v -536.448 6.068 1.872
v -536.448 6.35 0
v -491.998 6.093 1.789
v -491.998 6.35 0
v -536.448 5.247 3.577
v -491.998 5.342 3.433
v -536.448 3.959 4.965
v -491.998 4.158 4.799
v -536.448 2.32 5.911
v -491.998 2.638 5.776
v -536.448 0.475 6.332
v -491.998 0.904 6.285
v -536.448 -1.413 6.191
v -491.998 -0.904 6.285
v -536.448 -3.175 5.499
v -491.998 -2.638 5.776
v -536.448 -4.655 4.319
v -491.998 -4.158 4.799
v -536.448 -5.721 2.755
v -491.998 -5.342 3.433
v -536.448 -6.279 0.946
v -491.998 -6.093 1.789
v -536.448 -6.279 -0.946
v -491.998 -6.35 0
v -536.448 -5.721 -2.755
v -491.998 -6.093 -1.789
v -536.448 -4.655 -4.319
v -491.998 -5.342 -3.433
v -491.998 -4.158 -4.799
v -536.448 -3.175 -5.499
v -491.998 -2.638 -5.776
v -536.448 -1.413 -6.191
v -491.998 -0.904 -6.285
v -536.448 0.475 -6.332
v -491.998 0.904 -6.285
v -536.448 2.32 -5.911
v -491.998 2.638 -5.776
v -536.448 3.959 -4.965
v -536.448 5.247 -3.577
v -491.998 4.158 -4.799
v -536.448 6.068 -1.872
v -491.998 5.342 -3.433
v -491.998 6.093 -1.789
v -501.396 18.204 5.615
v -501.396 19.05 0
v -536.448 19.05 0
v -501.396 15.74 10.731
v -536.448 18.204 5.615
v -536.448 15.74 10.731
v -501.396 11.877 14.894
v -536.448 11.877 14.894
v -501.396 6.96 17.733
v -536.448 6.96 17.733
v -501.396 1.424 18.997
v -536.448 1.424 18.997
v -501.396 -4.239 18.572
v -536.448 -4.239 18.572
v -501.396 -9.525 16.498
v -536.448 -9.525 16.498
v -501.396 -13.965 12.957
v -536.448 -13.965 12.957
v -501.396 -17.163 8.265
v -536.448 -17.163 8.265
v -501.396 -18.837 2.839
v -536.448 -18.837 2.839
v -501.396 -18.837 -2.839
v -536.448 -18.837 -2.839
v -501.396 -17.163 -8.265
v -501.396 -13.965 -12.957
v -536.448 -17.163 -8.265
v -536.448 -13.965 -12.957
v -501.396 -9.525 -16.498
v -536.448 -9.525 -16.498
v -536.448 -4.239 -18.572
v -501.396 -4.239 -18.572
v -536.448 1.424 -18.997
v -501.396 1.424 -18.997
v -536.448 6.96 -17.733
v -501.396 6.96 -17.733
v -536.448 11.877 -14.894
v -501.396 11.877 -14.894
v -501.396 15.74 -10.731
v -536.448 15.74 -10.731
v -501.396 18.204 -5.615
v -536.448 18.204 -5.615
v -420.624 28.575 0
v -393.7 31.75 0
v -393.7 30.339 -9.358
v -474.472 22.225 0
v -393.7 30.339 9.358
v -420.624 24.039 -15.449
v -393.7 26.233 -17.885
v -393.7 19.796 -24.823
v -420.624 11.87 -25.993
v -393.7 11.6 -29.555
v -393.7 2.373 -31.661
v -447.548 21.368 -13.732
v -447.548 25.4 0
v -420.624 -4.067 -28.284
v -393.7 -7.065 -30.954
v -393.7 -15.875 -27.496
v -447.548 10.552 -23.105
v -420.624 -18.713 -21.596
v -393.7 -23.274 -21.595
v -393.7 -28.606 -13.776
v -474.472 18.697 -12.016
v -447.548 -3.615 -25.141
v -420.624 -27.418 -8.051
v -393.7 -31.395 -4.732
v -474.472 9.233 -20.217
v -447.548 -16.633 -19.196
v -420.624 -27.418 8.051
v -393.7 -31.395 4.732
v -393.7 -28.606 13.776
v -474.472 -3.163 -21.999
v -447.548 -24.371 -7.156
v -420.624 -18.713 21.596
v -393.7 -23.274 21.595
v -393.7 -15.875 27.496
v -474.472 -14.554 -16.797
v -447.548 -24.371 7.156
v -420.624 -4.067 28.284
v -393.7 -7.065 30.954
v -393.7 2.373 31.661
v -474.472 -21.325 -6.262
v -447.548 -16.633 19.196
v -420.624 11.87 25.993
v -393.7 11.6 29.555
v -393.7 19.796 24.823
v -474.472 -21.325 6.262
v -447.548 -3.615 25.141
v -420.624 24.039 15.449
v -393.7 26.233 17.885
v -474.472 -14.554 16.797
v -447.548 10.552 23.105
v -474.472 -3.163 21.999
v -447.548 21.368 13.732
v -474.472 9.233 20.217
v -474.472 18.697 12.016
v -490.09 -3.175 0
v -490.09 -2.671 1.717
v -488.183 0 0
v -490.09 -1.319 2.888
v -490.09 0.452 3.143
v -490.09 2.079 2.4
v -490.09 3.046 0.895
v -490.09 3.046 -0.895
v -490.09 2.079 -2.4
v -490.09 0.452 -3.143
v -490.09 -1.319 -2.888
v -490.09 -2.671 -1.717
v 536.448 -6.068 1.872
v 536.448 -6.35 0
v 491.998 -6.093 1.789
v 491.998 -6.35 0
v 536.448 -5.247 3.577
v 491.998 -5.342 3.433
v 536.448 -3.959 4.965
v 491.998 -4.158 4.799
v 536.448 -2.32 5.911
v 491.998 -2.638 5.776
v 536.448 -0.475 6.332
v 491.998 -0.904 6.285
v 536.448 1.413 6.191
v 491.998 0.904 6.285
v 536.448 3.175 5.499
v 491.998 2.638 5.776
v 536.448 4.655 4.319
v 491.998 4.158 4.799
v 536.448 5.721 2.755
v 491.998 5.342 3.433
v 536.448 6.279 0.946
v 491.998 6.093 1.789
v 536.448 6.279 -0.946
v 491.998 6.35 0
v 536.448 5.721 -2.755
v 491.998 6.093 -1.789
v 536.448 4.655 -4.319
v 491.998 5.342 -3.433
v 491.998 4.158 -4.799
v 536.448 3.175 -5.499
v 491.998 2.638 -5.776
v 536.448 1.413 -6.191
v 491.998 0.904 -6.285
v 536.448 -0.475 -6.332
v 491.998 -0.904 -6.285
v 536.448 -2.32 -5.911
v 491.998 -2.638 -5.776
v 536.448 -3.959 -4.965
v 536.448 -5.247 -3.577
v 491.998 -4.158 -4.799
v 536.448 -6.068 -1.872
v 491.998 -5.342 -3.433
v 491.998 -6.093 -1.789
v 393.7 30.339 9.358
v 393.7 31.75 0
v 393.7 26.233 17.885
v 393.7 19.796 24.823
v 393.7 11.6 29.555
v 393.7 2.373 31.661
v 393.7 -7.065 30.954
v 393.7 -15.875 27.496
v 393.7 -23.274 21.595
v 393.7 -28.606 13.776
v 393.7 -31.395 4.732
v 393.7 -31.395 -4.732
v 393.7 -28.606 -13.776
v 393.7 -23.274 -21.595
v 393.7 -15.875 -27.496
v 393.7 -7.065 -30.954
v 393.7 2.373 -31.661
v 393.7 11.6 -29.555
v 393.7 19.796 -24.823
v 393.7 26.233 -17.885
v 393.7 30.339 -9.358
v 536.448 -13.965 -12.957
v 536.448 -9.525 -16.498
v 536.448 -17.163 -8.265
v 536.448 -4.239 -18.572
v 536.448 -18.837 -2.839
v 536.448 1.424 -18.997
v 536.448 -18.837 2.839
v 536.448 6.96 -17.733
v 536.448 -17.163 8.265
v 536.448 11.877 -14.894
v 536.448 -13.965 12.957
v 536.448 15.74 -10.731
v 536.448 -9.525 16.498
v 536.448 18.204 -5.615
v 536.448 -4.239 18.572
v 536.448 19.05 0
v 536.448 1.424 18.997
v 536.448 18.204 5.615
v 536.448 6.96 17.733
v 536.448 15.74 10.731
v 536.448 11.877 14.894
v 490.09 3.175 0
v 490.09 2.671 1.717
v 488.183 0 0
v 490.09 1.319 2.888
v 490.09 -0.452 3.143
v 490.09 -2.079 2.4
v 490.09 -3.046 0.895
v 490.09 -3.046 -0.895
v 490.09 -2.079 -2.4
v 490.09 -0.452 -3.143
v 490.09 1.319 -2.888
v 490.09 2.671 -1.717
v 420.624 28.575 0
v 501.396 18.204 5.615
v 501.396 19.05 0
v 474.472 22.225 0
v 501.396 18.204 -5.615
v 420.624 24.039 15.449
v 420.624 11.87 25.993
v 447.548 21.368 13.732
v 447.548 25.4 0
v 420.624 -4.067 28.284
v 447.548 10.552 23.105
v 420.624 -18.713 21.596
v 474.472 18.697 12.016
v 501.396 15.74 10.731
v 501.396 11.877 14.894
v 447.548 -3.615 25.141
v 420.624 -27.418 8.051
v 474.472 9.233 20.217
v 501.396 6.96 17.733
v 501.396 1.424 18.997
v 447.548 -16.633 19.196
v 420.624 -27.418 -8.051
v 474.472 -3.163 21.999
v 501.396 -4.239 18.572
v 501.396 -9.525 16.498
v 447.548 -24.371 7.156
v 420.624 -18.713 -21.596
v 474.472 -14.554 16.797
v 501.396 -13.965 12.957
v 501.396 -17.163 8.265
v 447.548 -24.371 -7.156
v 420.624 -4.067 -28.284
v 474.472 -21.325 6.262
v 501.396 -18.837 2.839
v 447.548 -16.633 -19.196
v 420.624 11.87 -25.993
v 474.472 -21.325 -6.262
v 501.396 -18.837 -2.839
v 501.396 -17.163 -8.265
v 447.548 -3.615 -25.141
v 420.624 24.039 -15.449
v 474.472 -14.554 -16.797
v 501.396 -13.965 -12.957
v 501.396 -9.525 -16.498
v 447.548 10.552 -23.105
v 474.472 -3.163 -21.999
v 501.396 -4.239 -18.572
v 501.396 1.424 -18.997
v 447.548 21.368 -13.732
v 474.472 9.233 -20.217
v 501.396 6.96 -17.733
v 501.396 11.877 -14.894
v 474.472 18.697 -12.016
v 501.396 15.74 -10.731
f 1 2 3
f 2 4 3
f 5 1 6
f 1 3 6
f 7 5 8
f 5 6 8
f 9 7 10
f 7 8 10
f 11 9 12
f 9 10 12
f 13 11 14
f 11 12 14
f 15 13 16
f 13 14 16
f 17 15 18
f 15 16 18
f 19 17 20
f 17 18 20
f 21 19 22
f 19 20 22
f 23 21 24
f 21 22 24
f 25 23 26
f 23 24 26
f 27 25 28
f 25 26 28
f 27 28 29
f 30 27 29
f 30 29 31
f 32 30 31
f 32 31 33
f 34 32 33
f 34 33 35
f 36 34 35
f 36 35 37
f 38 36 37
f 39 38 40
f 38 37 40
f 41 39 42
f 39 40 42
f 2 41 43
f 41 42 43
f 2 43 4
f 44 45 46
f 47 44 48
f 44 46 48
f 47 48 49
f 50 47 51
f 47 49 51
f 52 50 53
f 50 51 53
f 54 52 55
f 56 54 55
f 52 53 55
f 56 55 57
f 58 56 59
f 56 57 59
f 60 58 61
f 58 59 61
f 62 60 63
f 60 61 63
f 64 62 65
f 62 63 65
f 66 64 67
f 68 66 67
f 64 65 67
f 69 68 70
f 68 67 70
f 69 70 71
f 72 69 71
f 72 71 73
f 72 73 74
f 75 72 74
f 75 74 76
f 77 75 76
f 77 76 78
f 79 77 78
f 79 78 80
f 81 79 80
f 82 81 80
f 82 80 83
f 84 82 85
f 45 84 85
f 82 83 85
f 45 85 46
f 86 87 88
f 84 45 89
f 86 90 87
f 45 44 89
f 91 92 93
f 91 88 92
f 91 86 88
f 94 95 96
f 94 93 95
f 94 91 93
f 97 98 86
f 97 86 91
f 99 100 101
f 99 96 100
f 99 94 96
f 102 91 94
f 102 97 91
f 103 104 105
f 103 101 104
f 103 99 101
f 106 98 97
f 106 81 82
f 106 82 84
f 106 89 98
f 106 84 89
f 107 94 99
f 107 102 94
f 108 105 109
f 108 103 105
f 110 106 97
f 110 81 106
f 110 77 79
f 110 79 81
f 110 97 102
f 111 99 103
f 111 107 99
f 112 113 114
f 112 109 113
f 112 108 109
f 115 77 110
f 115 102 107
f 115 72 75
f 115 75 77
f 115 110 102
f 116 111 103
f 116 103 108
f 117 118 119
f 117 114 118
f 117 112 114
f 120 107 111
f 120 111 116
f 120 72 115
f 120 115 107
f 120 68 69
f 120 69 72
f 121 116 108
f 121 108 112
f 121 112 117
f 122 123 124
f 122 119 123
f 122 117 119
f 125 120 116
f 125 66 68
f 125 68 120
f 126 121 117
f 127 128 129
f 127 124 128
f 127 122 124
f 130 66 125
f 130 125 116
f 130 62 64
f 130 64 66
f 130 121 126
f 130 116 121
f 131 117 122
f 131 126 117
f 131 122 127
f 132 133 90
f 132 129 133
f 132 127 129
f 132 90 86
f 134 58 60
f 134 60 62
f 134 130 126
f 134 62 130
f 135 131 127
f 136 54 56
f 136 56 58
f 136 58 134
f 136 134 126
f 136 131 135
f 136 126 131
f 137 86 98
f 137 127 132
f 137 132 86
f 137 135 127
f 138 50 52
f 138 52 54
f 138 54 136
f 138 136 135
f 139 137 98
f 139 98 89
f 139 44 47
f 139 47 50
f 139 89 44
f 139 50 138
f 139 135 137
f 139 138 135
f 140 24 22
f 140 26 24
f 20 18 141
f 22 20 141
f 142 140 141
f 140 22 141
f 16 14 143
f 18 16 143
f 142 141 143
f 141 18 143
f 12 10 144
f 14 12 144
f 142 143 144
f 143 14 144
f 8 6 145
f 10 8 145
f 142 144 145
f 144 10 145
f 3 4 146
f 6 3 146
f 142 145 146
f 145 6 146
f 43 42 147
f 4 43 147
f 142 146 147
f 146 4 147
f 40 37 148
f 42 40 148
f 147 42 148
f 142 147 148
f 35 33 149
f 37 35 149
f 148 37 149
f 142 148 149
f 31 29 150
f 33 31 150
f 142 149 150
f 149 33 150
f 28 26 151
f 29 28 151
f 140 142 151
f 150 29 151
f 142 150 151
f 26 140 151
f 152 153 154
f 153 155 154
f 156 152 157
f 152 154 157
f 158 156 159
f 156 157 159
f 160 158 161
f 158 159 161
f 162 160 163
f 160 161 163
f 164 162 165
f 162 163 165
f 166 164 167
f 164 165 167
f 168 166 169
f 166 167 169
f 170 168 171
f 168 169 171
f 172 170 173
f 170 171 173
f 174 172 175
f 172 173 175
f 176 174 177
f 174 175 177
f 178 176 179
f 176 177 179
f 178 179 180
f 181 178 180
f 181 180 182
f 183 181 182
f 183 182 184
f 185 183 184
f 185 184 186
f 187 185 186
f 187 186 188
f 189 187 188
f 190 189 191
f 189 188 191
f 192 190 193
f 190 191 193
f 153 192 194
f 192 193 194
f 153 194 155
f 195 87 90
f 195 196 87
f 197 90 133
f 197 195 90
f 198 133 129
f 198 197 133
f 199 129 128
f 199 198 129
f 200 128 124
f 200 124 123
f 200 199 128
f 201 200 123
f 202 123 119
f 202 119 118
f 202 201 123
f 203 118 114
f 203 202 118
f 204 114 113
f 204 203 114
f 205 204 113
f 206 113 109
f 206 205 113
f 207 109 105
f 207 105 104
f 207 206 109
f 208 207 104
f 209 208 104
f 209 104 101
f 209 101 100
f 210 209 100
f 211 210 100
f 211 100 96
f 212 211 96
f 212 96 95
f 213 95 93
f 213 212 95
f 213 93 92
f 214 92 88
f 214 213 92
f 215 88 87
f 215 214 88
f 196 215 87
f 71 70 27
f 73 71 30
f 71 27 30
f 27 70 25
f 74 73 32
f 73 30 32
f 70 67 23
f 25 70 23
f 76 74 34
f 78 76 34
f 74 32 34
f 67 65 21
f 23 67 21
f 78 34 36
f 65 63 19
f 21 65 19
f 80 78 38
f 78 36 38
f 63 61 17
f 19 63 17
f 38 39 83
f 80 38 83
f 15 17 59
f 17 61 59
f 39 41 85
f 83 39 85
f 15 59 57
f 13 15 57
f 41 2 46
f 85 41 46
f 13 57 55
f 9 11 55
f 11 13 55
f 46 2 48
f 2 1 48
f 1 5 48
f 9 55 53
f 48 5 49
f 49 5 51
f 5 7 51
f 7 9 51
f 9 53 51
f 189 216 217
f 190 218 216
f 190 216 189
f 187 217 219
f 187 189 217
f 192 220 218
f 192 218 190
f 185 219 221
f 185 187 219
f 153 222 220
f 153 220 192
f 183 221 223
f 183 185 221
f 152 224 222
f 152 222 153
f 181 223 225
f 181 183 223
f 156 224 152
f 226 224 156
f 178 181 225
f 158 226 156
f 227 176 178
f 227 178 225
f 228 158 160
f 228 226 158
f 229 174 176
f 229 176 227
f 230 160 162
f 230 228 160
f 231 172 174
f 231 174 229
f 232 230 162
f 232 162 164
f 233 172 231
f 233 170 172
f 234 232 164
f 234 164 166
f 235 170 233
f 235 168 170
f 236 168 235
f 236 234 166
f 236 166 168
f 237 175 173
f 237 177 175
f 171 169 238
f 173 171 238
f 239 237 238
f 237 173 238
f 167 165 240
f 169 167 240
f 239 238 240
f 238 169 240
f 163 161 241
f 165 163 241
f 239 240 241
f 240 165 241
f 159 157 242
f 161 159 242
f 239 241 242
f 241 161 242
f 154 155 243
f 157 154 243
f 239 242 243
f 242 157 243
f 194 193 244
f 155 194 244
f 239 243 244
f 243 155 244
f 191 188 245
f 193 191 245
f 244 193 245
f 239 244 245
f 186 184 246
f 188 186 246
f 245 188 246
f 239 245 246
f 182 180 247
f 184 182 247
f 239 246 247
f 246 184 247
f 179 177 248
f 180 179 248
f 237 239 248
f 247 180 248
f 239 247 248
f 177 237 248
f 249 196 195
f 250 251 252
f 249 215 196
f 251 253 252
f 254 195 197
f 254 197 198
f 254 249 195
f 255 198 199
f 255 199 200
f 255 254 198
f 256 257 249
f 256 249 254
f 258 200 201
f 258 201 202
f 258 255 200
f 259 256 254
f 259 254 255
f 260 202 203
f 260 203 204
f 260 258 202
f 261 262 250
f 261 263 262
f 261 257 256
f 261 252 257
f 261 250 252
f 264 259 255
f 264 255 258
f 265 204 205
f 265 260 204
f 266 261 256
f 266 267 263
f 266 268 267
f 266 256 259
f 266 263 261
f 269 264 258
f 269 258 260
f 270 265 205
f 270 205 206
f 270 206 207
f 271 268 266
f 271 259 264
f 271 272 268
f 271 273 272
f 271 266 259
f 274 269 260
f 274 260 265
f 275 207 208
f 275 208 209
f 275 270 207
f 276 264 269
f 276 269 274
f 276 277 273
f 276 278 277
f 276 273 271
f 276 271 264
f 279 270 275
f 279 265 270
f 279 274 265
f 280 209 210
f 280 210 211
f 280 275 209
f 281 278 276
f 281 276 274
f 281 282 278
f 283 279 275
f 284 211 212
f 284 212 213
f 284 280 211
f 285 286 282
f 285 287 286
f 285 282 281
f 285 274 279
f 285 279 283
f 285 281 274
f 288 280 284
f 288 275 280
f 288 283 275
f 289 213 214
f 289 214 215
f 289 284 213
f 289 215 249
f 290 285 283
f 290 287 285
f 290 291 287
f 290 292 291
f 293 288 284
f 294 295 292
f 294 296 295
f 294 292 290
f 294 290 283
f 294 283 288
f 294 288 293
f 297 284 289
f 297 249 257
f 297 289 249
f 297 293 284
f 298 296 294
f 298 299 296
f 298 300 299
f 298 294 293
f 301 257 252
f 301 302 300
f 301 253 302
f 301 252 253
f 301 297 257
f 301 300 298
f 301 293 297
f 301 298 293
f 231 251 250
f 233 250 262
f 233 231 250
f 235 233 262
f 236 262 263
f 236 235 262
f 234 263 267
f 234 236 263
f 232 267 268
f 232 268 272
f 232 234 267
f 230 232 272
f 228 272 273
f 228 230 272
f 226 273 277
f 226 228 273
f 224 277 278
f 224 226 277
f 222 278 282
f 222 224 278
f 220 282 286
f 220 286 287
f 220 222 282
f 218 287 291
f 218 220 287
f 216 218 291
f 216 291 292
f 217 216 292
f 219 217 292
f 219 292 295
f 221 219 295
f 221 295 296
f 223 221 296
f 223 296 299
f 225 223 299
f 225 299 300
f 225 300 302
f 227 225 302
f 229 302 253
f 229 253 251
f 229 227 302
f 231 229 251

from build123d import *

# Parameters (mm, degrees)
F0_R       = 31.75
F1_DEPTH   = 393.7
F3_R       = 19.05
F4_DEPTH   = 35.052
F1_FACE_R  = 31.75
F4_FACE_R  = 19.05
F1_FACE1_R = 31.75
F5_FACE_R  = 19.05
F9_D       = 12.7
F9_DEPTH   = 44.45
F9_TIP     = 3.8154649308
F11_D      = 12.7
F11_DEPTH  = 44.45
F11_TIP    = 3.8154649308


with BuildPart() as f1:
    # F0 (on Right) → F1 (new body, symmetric)
    with BuildSketch(Plane.YZ):
        Circle(F0_R)
    extrude(amount=F1_DEPTH, both=True)



with BuildPart() as f4:
    # F3 (on offset) → F4 (new body)
    with BuildSketch(Plane.YZ.offset(536.448)):
        Circle(F3_R)
    extrude(amount=-F4_DEPTH)


with BuildPart() as f5_1:
    # F5: instance of F4
    add(f4.part.mirror(Plane.YZ))


with BuildPart() as f1_1:
    add(f1.part)

    add(f4.part)  # F6 merges F4
    # F1_face (on face) → F6 section 0
    with BuildSketch(Plane.YZ.offset(393.7)):
        Circle(F1_FACE_R)
    # F4_face (on face) → F6 section 1
    with BuildSketch(Plane(origin=(501.396, 0, 0), x_dir=(0, 1, 0), z_dir=(-1, 0, 0))):
        Circle(F4_FACE_R)
    loft()


    add(f5_1.part)  # F7 merges F5_1
    # F1_face1 (on face) → F7 section 0
    with BuildSketch(Plane(origin=(-393.7, 0, 0), x_dir=(0, 1, 0), z_dir=(-1, 0, 0))):
        Circle(F1_FACE1_R)
    # F5_face (on face) → F7 section 1
    with BuildSketch(Plane.YZ.offset(-501.396)):
        Circle(F5_FACE_R)
    loft()

    # F9
    with Locations(Plane.YZ.offset(536.448)):
        with Locations((0, 0)):
            Hole(F9_D / 2, depth=F9_DEPTH)
            with Locations((0, 0, -(F9_DEPTH + F9_TIP / 2))):  # 118° drill point
                Cone(0, F9_D / 2, F9_TIP, mode=Mode.SUBTRACT)

    # F11
    with Locations(Plane(origin=(-536.448, 0, 0), x_dir=(0, -1, 0), z_dir=(-1, 0, 0))):
        with Locations((0, 0)):
            Hole(F11_D / 2, depth=F11_DEPTH)
            with Locations((0, 0, -(F11_DEPTH + F11_TIP / 2))):  # 118° drill point
                Cone(0, F11_D / 2, F11_TIP, mode=Mode.SUBTRACT)


solid = f1_1.part
